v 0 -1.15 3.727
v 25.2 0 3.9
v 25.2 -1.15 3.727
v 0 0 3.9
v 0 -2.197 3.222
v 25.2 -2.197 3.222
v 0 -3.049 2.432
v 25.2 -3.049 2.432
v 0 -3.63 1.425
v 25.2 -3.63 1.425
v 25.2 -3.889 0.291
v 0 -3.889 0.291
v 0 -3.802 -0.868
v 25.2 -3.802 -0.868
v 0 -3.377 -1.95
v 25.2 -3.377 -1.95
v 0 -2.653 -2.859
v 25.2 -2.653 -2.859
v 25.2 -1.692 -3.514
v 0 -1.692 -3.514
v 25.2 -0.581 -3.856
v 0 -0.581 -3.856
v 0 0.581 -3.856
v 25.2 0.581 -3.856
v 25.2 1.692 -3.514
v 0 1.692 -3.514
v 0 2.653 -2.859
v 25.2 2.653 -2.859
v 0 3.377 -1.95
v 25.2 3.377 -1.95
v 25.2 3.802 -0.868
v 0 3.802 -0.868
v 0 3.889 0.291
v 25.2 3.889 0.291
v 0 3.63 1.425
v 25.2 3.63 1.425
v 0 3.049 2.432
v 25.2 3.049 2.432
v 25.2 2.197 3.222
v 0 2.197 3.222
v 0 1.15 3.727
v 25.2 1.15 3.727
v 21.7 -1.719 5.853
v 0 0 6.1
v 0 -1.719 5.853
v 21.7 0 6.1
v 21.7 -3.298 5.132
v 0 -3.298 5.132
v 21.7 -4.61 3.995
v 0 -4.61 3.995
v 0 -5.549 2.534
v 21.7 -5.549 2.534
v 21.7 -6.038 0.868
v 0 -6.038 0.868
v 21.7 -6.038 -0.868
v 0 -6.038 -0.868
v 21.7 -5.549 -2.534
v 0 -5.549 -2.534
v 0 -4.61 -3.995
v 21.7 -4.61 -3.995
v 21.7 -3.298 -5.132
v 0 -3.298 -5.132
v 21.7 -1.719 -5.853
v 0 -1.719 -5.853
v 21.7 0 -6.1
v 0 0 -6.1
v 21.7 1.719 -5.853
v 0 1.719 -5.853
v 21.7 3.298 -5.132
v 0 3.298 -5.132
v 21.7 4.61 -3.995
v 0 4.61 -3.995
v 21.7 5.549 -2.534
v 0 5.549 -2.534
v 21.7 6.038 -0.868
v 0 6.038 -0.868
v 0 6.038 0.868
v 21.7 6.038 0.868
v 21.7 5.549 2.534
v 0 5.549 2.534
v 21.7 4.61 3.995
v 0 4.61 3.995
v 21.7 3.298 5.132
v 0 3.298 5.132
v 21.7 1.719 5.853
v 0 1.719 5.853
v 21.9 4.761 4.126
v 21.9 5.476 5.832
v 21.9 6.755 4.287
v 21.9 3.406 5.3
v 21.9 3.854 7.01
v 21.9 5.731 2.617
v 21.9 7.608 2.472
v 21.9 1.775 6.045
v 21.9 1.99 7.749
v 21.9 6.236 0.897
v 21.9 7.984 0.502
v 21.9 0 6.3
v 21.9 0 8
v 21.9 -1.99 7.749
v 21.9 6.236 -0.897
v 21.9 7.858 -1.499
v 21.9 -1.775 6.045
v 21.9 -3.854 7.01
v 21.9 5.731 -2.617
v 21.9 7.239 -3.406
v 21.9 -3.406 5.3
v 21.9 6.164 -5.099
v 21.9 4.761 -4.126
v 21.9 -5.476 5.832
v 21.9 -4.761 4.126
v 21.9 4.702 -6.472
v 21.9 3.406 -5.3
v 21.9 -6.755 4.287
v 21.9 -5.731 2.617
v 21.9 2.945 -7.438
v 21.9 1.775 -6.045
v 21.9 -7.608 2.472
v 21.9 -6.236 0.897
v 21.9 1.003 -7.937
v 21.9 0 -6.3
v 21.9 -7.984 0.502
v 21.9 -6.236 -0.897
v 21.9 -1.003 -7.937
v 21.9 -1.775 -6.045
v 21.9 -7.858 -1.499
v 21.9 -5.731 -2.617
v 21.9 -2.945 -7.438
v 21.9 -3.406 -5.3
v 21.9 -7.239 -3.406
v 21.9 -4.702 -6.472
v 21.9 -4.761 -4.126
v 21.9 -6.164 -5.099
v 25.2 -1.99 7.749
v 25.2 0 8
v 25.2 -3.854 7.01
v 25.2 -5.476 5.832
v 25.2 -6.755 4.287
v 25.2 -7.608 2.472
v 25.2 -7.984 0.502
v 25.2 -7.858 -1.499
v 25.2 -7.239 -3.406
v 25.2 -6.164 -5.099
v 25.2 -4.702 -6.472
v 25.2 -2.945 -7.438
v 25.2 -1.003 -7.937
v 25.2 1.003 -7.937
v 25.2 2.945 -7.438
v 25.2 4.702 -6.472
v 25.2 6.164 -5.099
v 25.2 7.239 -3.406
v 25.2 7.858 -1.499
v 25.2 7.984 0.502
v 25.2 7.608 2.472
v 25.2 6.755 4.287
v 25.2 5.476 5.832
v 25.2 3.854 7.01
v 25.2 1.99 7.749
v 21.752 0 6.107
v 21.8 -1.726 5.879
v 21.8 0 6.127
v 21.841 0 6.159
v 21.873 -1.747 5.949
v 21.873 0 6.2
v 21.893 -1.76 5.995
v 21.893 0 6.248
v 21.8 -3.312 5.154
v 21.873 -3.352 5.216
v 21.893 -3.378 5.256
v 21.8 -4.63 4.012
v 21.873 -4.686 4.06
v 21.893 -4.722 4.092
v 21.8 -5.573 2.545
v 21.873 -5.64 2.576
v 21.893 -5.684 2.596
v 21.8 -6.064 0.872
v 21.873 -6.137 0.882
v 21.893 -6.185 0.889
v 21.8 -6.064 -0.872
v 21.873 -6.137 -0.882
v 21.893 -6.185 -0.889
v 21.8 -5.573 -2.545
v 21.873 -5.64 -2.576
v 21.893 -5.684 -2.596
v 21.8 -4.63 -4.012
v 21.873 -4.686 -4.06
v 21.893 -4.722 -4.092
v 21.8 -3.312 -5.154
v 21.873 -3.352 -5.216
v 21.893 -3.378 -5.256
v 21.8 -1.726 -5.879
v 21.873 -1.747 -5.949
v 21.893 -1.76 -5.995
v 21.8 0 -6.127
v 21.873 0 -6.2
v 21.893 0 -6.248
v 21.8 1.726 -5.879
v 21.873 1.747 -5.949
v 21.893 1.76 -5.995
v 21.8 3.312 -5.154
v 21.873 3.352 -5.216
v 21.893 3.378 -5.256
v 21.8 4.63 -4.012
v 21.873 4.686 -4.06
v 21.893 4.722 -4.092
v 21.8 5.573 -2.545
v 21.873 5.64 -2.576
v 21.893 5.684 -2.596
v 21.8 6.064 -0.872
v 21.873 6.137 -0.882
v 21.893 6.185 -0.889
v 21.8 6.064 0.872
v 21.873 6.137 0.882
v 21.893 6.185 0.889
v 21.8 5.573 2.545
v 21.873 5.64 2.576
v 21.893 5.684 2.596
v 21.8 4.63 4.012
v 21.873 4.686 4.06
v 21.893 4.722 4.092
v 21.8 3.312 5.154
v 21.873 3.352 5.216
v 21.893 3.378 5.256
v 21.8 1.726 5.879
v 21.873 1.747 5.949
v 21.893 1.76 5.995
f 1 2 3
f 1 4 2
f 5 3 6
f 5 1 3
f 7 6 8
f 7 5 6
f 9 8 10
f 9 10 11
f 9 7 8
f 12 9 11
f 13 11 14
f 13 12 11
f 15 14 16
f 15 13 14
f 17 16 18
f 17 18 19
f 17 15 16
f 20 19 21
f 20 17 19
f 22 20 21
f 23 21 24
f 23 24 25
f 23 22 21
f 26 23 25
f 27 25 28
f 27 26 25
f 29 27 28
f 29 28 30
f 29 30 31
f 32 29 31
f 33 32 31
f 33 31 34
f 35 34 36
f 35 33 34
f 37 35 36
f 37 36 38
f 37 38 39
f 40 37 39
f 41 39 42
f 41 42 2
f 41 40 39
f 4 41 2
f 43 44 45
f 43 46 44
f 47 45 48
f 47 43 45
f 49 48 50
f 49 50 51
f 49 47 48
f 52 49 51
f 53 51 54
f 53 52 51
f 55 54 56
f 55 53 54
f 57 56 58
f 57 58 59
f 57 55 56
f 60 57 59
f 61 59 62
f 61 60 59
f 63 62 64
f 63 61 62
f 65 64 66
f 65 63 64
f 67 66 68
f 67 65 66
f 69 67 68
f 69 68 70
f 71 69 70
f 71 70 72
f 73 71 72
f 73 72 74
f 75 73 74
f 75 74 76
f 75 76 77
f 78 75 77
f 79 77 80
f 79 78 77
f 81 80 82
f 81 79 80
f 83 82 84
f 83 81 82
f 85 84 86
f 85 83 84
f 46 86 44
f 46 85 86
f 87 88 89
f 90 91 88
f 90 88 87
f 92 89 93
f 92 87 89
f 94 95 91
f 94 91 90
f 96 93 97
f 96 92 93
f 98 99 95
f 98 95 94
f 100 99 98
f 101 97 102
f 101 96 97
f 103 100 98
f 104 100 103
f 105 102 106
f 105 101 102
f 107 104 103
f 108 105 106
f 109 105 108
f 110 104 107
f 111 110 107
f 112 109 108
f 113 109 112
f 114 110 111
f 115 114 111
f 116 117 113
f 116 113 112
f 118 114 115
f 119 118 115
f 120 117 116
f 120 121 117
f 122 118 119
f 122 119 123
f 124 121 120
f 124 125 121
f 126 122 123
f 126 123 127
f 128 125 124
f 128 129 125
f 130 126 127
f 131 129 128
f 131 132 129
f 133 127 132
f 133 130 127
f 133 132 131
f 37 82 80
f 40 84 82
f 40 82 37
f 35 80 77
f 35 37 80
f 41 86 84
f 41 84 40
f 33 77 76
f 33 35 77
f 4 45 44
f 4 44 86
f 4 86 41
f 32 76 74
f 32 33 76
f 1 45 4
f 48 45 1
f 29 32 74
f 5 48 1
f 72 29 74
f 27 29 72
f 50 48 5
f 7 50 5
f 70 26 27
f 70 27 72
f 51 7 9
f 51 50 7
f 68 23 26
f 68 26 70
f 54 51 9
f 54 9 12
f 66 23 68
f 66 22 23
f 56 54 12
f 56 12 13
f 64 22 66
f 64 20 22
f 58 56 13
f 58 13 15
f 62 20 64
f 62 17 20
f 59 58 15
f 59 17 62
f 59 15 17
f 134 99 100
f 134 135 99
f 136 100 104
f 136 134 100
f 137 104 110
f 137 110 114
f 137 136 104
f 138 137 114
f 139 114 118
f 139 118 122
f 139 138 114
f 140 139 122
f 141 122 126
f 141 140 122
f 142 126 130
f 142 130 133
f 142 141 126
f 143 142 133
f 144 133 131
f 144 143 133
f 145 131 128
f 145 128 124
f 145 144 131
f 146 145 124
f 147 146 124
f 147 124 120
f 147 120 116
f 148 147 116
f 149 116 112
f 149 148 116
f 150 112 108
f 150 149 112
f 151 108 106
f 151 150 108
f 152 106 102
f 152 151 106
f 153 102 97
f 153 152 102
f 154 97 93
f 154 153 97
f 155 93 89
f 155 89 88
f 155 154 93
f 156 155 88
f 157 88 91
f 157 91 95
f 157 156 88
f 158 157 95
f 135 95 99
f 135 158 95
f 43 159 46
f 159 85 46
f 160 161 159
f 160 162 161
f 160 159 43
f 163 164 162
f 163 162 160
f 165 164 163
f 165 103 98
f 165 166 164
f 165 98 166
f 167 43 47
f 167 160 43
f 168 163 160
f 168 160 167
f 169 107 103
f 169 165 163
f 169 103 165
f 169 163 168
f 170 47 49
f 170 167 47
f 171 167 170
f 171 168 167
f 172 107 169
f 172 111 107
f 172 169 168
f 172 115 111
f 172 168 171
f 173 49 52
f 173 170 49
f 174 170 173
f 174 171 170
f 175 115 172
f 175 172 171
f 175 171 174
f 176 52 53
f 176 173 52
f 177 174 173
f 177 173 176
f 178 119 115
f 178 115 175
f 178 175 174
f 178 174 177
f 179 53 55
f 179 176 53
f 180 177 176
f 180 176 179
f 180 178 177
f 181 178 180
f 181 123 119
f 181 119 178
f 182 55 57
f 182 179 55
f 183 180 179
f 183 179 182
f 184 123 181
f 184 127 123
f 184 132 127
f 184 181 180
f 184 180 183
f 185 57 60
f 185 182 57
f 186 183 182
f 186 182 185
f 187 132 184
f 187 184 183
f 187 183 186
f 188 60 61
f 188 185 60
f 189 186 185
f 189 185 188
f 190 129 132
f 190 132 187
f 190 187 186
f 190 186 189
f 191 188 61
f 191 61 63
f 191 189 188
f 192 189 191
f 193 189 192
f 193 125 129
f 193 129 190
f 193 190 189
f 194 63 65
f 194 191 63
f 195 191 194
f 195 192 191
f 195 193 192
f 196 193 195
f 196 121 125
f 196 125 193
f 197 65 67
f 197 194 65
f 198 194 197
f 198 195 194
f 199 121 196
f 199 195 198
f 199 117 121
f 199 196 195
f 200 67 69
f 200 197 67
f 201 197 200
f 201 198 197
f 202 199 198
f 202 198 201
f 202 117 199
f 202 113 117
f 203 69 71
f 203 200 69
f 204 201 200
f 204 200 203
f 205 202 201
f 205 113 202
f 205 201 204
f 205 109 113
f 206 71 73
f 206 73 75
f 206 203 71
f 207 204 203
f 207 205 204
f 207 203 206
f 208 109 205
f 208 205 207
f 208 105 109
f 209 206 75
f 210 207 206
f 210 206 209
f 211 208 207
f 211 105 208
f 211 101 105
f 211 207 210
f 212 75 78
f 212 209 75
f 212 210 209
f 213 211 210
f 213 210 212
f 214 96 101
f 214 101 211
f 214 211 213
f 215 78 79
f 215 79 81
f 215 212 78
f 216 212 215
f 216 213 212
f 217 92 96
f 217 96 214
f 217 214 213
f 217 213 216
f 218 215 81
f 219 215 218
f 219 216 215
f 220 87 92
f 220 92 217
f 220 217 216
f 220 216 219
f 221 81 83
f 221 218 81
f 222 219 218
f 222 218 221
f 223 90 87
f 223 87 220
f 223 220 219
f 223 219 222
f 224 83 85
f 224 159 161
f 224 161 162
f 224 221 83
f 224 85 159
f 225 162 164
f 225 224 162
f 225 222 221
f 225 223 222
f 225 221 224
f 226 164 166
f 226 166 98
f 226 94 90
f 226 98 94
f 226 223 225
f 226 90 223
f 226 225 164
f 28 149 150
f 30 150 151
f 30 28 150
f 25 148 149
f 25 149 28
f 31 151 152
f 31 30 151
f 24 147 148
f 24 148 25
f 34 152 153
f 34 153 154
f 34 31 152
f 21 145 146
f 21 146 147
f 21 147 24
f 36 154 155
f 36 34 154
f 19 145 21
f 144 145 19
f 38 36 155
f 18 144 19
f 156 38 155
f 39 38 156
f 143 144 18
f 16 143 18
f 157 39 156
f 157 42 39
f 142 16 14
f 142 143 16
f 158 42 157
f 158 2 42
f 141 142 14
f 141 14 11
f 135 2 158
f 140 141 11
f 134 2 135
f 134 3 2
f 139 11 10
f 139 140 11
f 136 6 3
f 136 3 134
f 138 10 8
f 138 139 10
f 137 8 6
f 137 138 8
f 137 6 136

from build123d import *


with BuildPart() as part:
    # Schizzo1 → Rivoluzione1 (revolve)
    with BuildSketch(Plane(origin=(0, 0, 0), x_dir=(1, 0, 0), z_dir=(0, 1, 0)), mode=Mode.PRIVATE) as rivoluzione1_sk:
        with BuildLine():
            Line((0, 3.9), (0, 6.1))
            Line((0, 6.1), (21.7, 6.1))
            ThreePointArc((21.7, 6.1), (21.841421356, 6.158578644), (21.9, 6.3))
            Line((21.9, 6.3), (21.9, 8))
            Line((21.9, 8), (25.2, 8))
            Line((25.2, 8), (25.2, 3.9))
            Line((25.2, 3.9), (0, 3.9))
        make_face()
    revolve(rivoluzione1_sk.sketch.rotate(Axis((-60.499740909, 0, 0), (1, 0, 0)), 180), axis=Axis((-60.499740909, 0, 0), (1, 0, 0)))


solid = part.part
